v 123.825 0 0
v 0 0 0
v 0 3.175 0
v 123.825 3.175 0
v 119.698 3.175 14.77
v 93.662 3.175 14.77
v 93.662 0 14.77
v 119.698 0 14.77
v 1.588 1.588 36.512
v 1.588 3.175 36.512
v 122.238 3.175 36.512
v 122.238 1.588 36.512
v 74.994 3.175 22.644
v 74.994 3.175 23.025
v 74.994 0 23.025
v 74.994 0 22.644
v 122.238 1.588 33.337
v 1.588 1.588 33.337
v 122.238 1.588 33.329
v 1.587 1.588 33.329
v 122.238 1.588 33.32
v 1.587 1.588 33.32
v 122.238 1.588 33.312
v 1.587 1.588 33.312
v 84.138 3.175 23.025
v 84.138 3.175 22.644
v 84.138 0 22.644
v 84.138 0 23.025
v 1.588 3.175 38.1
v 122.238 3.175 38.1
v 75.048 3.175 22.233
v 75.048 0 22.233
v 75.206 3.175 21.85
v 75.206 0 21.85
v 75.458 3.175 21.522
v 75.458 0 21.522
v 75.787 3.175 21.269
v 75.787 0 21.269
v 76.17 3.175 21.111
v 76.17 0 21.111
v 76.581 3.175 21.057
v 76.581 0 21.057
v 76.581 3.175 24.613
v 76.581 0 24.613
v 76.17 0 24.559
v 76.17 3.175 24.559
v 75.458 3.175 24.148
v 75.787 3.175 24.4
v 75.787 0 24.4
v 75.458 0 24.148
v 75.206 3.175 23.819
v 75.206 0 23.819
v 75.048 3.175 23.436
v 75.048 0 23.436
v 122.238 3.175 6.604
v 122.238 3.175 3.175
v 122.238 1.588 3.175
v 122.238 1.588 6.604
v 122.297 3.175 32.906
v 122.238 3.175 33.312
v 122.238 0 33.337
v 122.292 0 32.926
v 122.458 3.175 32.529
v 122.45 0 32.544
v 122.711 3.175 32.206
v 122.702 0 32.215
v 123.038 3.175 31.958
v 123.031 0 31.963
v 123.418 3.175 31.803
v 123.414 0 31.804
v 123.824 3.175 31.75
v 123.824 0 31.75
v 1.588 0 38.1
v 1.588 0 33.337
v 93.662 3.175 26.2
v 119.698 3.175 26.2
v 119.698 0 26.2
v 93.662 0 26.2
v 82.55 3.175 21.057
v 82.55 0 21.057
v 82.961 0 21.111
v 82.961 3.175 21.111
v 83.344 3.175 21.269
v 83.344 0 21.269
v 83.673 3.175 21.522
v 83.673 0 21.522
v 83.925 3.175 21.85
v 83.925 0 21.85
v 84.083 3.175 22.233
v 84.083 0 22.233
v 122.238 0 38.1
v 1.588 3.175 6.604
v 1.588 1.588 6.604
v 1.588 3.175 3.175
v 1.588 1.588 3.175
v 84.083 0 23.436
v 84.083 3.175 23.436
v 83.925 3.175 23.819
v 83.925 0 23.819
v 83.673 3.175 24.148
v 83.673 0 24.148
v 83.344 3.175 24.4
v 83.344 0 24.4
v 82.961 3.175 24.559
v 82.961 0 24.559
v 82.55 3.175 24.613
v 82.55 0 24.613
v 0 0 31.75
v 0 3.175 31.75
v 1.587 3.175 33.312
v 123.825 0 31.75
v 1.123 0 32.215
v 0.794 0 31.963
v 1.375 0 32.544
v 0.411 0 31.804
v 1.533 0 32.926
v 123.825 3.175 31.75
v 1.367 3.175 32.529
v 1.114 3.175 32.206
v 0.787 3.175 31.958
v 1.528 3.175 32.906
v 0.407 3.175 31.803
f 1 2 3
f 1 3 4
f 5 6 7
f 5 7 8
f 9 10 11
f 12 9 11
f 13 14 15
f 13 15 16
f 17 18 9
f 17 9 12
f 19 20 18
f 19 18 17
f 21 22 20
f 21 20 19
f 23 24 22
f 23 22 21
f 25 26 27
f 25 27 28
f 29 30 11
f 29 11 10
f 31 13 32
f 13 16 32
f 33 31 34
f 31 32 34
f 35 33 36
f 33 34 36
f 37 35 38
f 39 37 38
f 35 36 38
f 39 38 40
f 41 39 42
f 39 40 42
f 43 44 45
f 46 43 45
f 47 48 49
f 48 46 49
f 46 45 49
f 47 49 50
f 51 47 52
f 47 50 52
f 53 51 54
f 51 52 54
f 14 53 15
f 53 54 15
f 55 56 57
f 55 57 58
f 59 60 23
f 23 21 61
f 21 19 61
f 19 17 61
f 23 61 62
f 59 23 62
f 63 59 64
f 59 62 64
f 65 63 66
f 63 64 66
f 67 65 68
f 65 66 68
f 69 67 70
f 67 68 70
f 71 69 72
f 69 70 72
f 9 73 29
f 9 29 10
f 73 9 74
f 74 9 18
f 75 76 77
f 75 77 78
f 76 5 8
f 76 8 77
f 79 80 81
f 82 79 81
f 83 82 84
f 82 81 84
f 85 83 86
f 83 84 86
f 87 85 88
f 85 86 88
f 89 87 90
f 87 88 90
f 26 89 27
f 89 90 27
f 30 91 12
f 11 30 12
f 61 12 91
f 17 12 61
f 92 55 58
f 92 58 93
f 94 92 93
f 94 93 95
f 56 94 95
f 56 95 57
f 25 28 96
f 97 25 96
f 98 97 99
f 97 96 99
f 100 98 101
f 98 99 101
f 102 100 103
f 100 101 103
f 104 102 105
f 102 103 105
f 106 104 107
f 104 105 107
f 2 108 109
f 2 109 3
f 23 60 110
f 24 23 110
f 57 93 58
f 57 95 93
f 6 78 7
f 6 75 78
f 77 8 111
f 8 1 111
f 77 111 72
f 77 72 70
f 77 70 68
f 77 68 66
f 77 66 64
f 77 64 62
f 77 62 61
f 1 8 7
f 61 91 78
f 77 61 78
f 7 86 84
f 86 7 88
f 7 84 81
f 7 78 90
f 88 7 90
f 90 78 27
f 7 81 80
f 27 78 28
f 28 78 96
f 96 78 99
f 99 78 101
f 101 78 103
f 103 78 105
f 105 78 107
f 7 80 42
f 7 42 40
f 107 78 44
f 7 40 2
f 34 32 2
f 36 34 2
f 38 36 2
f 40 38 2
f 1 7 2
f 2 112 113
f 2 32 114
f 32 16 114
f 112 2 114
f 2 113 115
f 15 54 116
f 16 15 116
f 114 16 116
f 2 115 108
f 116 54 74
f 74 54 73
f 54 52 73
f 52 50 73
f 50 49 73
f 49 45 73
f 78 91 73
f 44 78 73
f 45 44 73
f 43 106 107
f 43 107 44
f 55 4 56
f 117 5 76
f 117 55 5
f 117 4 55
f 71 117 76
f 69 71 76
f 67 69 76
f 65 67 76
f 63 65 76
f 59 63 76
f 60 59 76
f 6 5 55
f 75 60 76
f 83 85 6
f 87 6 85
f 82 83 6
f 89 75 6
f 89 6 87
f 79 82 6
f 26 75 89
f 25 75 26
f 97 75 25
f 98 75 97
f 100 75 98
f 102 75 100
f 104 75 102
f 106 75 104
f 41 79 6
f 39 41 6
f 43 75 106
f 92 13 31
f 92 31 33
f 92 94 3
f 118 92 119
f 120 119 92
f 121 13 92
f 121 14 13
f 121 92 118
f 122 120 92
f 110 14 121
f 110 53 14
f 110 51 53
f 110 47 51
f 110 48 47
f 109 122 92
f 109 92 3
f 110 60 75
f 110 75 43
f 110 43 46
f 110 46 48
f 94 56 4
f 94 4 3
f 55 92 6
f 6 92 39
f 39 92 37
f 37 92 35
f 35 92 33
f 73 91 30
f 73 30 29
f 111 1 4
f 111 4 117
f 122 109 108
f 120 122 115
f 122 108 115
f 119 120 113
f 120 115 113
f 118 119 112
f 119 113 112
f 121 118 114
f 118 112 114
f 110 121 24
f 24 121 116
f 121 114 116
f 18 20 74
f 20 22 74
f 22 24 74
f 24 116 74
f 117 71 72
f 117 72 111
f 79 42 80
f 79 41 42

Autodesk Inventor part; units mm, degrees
ref_plane "YZ Plane" through (0, 0, 0) normal (1, 0, 0) x (0, 1, 0)
ref_plane "XZ Plane" through (0, 0, 0) normal (0, 1, 0) x (-1, 0, 0)
ref_plane "XY Plane" through (0, 0, 0) normal (0, 0, 1) x (1, 0, 0)
sketch "Sketch1" plane through (0, 0, 0) normal (0, 1, 0) x (-1, 0, 0)
  line L0 (0, 0) -> (-123.825, 0)
  line L1 (-123.825, 0) -> (-123.825, 38.1)
  line L2 (-123.825, 38.1) -> (0, 38.1)
  line L3 (0, 38.1) -> (0, 0)
  dimension "d0" = 123.825
  dimension "d1" = 38.1
extrude "Extrusion1" add sketch "Sketch1" along normal blind 3.175
sketch "Sketch2" plane through (0, 3.175, 0) normal (0, 1, 0) x (1, 0, 0)
  line L0 (123.825, 0) -> (0, 0) projected
  line L1 (0, 0) -> (0, -38.1) projected
  line L2 (0, -38.1) -> (123.825, -38.1) projected
  line L3 (123.825, -38.1) -> (123.825, 0) projected
  line L4 (0, -36.5125) -> (123.825, -36.5125)
  line L5 (123.825, -36.5125) -> (123.825, -33.3121)
  line L6 (123.825, -33.3121) -> (0, -33.3121)
  line L7 (0, -33.3121) -> (0, -36.5125)
  line L8 (1.5875, -3.175) -> (122.2375, -3.175)
  line L9 (122.2375, -3.175) -> (122.2375, -6.604)
  line L10 (122.2375, -6.604) -> (1.5875, -6.604)
  line L11 (1.5875, -6.604) -> (1.5875, -3.175)
  dimension "d6" = 3.2004
  dimension "d7" = 1.5875
  dimension "d10" = 3.175
  dimension "d11" = 3.429
  dimension "d12" = 1.5875
  dimension "d13" = 1.5875
extrude "Extrusion2" cut sketch "Sketch2" against normal blind 1.5875 contours L3 L4 L1 L6
sketch "Sketch3" plane through (0, 3.175, 0) normal (0, 1, 0) x (1, 0, 0)
  line L0 (123.825, -33.3121) -> (123.825, 0) projected
  line L1 (123.825, 0) -> (0, 0) projected
  line L2 (0, 0) -> (0, -33.3121) projected
  line L3 (1.5875, -3.175) -> (122.2375, -3.175)
  line L4 (122.2375, -3.175) -> (122.2375, -6.604)
  line L5 (122.2375, -6.604) -> (1.5875, -6.604)
  line L6 (1.5875, -6.604) -> (1.5875, -3.175)
  dimension "d14" = 1.5875
  dimension "d15" = 1.5875
  dimension "d16" = 3.175
  dimension "d17" = 3.429
extrude "Extrusion3" cut sketch "Sketch3" against normal blind 1.5875
sketch "Sketch4" plane through (0, 3.175, 0) normal (0, 1, 0) x (1, 0, 0)
  line L0 (0, -38.1) -> (1.5875, -38.1)
  line L1 (1.5875, -38.1) -> (1.5875, -31.75)
  line L2 (1.5875, -31.75) -> (0, -31.75)
  line L3 (0, -31.75) -> (0, -38.1)
  line L4 (123.825, -38.1) -> (122.2375, -38.1)
  line L5 (122.2375, -38.1) -> (122.2375, -31.75)
  line L6 (122.2375, -31.75) -> (123.825, -31.75)
  line L7 (123.825, -31.75) -> (123.825, -38.1)
  point P0 (0, 0)
  dimension "d20" = 1.5875
  dimension "d21" = 6.35
  dimension "d22" = 6.35
  dimension "d23" = 1.5875
extrude "Extrusion4" cut sketch "Sketch4" against normal blind 25.4
fillet "Fillet1" radius 1.5875 1 edges at (122.2375, 1.5875, 31.75)
fillet "Fillet2" radius 1.5875 1 edges at (1.5875, 1.5875, 31.75)
sketch "Sketch5" plane through (0, 3.175, 0) normal (0, 1, 0) x (1, 0, 0)
  line L0 (1.5873, -33.3121) -> (122.2377, -33.3121) projected
  line L1 (74.9935, -21.0566) -> (84.1375, -21.0566)
  line L2 (84.1375, -21.0566) -> (84.1375, -24.6126)
  line L3 (84.1375, -24.6126) -> (74.9935, -24.6126)
  line L4 (74.9935, -24.6126) -> (74.9935, -21.0566)
  line L5 (122.2375, -36.5125) -> (122.2375, -33.3375) projected
  dimension "d28" = 8.6995
  dimension "d29" = 3.556
  dimension "d30" = 9.144
  dimension "d44" = 38.1
extrude "Extrusion5" cut sketch "Sketch5" against normal blind 25.4
fillet "Fillet3" radius 1.5875 4 edges at (74.9935, 1.5875, 21.0566) (84.1375, 1.5875, 21.0566) (84.1375, 1.5875, 24.6126) (74.9935, 1.5875, 24.6126)
sketch "Sketch6" plane through (0, 3.175, 0) normal (0, 1, 0) x (1, 0, 0)
  line L0 (1.5873, -33.3121) -> (122.2377, -33.3121) projected
  line L1 (93.6625, -14.7701) -> (119.6975, -14.7701)
  line L2 (119.6975, -14.7701) -> (119.6975, -26.2001)
  line L3 (119.6975, -26.2001) -> (93.6625, -26.2001)
  line L4 (93.6625, -26.2001) -> (93.6625, -14.7701)
  line L5 (122.2375, -36.5125) -> (122.2375, -33.3375) projected
  dimension "d35" = 26.035
  dimension "d36" = 11.43
  dimension "d41" = 7.112
  dimension "d43" = 2.54
extrude "Extrusion6" cut sketch "Sketch6" against normal blind 25.4
properties part number "Electronics Container Part 4"
